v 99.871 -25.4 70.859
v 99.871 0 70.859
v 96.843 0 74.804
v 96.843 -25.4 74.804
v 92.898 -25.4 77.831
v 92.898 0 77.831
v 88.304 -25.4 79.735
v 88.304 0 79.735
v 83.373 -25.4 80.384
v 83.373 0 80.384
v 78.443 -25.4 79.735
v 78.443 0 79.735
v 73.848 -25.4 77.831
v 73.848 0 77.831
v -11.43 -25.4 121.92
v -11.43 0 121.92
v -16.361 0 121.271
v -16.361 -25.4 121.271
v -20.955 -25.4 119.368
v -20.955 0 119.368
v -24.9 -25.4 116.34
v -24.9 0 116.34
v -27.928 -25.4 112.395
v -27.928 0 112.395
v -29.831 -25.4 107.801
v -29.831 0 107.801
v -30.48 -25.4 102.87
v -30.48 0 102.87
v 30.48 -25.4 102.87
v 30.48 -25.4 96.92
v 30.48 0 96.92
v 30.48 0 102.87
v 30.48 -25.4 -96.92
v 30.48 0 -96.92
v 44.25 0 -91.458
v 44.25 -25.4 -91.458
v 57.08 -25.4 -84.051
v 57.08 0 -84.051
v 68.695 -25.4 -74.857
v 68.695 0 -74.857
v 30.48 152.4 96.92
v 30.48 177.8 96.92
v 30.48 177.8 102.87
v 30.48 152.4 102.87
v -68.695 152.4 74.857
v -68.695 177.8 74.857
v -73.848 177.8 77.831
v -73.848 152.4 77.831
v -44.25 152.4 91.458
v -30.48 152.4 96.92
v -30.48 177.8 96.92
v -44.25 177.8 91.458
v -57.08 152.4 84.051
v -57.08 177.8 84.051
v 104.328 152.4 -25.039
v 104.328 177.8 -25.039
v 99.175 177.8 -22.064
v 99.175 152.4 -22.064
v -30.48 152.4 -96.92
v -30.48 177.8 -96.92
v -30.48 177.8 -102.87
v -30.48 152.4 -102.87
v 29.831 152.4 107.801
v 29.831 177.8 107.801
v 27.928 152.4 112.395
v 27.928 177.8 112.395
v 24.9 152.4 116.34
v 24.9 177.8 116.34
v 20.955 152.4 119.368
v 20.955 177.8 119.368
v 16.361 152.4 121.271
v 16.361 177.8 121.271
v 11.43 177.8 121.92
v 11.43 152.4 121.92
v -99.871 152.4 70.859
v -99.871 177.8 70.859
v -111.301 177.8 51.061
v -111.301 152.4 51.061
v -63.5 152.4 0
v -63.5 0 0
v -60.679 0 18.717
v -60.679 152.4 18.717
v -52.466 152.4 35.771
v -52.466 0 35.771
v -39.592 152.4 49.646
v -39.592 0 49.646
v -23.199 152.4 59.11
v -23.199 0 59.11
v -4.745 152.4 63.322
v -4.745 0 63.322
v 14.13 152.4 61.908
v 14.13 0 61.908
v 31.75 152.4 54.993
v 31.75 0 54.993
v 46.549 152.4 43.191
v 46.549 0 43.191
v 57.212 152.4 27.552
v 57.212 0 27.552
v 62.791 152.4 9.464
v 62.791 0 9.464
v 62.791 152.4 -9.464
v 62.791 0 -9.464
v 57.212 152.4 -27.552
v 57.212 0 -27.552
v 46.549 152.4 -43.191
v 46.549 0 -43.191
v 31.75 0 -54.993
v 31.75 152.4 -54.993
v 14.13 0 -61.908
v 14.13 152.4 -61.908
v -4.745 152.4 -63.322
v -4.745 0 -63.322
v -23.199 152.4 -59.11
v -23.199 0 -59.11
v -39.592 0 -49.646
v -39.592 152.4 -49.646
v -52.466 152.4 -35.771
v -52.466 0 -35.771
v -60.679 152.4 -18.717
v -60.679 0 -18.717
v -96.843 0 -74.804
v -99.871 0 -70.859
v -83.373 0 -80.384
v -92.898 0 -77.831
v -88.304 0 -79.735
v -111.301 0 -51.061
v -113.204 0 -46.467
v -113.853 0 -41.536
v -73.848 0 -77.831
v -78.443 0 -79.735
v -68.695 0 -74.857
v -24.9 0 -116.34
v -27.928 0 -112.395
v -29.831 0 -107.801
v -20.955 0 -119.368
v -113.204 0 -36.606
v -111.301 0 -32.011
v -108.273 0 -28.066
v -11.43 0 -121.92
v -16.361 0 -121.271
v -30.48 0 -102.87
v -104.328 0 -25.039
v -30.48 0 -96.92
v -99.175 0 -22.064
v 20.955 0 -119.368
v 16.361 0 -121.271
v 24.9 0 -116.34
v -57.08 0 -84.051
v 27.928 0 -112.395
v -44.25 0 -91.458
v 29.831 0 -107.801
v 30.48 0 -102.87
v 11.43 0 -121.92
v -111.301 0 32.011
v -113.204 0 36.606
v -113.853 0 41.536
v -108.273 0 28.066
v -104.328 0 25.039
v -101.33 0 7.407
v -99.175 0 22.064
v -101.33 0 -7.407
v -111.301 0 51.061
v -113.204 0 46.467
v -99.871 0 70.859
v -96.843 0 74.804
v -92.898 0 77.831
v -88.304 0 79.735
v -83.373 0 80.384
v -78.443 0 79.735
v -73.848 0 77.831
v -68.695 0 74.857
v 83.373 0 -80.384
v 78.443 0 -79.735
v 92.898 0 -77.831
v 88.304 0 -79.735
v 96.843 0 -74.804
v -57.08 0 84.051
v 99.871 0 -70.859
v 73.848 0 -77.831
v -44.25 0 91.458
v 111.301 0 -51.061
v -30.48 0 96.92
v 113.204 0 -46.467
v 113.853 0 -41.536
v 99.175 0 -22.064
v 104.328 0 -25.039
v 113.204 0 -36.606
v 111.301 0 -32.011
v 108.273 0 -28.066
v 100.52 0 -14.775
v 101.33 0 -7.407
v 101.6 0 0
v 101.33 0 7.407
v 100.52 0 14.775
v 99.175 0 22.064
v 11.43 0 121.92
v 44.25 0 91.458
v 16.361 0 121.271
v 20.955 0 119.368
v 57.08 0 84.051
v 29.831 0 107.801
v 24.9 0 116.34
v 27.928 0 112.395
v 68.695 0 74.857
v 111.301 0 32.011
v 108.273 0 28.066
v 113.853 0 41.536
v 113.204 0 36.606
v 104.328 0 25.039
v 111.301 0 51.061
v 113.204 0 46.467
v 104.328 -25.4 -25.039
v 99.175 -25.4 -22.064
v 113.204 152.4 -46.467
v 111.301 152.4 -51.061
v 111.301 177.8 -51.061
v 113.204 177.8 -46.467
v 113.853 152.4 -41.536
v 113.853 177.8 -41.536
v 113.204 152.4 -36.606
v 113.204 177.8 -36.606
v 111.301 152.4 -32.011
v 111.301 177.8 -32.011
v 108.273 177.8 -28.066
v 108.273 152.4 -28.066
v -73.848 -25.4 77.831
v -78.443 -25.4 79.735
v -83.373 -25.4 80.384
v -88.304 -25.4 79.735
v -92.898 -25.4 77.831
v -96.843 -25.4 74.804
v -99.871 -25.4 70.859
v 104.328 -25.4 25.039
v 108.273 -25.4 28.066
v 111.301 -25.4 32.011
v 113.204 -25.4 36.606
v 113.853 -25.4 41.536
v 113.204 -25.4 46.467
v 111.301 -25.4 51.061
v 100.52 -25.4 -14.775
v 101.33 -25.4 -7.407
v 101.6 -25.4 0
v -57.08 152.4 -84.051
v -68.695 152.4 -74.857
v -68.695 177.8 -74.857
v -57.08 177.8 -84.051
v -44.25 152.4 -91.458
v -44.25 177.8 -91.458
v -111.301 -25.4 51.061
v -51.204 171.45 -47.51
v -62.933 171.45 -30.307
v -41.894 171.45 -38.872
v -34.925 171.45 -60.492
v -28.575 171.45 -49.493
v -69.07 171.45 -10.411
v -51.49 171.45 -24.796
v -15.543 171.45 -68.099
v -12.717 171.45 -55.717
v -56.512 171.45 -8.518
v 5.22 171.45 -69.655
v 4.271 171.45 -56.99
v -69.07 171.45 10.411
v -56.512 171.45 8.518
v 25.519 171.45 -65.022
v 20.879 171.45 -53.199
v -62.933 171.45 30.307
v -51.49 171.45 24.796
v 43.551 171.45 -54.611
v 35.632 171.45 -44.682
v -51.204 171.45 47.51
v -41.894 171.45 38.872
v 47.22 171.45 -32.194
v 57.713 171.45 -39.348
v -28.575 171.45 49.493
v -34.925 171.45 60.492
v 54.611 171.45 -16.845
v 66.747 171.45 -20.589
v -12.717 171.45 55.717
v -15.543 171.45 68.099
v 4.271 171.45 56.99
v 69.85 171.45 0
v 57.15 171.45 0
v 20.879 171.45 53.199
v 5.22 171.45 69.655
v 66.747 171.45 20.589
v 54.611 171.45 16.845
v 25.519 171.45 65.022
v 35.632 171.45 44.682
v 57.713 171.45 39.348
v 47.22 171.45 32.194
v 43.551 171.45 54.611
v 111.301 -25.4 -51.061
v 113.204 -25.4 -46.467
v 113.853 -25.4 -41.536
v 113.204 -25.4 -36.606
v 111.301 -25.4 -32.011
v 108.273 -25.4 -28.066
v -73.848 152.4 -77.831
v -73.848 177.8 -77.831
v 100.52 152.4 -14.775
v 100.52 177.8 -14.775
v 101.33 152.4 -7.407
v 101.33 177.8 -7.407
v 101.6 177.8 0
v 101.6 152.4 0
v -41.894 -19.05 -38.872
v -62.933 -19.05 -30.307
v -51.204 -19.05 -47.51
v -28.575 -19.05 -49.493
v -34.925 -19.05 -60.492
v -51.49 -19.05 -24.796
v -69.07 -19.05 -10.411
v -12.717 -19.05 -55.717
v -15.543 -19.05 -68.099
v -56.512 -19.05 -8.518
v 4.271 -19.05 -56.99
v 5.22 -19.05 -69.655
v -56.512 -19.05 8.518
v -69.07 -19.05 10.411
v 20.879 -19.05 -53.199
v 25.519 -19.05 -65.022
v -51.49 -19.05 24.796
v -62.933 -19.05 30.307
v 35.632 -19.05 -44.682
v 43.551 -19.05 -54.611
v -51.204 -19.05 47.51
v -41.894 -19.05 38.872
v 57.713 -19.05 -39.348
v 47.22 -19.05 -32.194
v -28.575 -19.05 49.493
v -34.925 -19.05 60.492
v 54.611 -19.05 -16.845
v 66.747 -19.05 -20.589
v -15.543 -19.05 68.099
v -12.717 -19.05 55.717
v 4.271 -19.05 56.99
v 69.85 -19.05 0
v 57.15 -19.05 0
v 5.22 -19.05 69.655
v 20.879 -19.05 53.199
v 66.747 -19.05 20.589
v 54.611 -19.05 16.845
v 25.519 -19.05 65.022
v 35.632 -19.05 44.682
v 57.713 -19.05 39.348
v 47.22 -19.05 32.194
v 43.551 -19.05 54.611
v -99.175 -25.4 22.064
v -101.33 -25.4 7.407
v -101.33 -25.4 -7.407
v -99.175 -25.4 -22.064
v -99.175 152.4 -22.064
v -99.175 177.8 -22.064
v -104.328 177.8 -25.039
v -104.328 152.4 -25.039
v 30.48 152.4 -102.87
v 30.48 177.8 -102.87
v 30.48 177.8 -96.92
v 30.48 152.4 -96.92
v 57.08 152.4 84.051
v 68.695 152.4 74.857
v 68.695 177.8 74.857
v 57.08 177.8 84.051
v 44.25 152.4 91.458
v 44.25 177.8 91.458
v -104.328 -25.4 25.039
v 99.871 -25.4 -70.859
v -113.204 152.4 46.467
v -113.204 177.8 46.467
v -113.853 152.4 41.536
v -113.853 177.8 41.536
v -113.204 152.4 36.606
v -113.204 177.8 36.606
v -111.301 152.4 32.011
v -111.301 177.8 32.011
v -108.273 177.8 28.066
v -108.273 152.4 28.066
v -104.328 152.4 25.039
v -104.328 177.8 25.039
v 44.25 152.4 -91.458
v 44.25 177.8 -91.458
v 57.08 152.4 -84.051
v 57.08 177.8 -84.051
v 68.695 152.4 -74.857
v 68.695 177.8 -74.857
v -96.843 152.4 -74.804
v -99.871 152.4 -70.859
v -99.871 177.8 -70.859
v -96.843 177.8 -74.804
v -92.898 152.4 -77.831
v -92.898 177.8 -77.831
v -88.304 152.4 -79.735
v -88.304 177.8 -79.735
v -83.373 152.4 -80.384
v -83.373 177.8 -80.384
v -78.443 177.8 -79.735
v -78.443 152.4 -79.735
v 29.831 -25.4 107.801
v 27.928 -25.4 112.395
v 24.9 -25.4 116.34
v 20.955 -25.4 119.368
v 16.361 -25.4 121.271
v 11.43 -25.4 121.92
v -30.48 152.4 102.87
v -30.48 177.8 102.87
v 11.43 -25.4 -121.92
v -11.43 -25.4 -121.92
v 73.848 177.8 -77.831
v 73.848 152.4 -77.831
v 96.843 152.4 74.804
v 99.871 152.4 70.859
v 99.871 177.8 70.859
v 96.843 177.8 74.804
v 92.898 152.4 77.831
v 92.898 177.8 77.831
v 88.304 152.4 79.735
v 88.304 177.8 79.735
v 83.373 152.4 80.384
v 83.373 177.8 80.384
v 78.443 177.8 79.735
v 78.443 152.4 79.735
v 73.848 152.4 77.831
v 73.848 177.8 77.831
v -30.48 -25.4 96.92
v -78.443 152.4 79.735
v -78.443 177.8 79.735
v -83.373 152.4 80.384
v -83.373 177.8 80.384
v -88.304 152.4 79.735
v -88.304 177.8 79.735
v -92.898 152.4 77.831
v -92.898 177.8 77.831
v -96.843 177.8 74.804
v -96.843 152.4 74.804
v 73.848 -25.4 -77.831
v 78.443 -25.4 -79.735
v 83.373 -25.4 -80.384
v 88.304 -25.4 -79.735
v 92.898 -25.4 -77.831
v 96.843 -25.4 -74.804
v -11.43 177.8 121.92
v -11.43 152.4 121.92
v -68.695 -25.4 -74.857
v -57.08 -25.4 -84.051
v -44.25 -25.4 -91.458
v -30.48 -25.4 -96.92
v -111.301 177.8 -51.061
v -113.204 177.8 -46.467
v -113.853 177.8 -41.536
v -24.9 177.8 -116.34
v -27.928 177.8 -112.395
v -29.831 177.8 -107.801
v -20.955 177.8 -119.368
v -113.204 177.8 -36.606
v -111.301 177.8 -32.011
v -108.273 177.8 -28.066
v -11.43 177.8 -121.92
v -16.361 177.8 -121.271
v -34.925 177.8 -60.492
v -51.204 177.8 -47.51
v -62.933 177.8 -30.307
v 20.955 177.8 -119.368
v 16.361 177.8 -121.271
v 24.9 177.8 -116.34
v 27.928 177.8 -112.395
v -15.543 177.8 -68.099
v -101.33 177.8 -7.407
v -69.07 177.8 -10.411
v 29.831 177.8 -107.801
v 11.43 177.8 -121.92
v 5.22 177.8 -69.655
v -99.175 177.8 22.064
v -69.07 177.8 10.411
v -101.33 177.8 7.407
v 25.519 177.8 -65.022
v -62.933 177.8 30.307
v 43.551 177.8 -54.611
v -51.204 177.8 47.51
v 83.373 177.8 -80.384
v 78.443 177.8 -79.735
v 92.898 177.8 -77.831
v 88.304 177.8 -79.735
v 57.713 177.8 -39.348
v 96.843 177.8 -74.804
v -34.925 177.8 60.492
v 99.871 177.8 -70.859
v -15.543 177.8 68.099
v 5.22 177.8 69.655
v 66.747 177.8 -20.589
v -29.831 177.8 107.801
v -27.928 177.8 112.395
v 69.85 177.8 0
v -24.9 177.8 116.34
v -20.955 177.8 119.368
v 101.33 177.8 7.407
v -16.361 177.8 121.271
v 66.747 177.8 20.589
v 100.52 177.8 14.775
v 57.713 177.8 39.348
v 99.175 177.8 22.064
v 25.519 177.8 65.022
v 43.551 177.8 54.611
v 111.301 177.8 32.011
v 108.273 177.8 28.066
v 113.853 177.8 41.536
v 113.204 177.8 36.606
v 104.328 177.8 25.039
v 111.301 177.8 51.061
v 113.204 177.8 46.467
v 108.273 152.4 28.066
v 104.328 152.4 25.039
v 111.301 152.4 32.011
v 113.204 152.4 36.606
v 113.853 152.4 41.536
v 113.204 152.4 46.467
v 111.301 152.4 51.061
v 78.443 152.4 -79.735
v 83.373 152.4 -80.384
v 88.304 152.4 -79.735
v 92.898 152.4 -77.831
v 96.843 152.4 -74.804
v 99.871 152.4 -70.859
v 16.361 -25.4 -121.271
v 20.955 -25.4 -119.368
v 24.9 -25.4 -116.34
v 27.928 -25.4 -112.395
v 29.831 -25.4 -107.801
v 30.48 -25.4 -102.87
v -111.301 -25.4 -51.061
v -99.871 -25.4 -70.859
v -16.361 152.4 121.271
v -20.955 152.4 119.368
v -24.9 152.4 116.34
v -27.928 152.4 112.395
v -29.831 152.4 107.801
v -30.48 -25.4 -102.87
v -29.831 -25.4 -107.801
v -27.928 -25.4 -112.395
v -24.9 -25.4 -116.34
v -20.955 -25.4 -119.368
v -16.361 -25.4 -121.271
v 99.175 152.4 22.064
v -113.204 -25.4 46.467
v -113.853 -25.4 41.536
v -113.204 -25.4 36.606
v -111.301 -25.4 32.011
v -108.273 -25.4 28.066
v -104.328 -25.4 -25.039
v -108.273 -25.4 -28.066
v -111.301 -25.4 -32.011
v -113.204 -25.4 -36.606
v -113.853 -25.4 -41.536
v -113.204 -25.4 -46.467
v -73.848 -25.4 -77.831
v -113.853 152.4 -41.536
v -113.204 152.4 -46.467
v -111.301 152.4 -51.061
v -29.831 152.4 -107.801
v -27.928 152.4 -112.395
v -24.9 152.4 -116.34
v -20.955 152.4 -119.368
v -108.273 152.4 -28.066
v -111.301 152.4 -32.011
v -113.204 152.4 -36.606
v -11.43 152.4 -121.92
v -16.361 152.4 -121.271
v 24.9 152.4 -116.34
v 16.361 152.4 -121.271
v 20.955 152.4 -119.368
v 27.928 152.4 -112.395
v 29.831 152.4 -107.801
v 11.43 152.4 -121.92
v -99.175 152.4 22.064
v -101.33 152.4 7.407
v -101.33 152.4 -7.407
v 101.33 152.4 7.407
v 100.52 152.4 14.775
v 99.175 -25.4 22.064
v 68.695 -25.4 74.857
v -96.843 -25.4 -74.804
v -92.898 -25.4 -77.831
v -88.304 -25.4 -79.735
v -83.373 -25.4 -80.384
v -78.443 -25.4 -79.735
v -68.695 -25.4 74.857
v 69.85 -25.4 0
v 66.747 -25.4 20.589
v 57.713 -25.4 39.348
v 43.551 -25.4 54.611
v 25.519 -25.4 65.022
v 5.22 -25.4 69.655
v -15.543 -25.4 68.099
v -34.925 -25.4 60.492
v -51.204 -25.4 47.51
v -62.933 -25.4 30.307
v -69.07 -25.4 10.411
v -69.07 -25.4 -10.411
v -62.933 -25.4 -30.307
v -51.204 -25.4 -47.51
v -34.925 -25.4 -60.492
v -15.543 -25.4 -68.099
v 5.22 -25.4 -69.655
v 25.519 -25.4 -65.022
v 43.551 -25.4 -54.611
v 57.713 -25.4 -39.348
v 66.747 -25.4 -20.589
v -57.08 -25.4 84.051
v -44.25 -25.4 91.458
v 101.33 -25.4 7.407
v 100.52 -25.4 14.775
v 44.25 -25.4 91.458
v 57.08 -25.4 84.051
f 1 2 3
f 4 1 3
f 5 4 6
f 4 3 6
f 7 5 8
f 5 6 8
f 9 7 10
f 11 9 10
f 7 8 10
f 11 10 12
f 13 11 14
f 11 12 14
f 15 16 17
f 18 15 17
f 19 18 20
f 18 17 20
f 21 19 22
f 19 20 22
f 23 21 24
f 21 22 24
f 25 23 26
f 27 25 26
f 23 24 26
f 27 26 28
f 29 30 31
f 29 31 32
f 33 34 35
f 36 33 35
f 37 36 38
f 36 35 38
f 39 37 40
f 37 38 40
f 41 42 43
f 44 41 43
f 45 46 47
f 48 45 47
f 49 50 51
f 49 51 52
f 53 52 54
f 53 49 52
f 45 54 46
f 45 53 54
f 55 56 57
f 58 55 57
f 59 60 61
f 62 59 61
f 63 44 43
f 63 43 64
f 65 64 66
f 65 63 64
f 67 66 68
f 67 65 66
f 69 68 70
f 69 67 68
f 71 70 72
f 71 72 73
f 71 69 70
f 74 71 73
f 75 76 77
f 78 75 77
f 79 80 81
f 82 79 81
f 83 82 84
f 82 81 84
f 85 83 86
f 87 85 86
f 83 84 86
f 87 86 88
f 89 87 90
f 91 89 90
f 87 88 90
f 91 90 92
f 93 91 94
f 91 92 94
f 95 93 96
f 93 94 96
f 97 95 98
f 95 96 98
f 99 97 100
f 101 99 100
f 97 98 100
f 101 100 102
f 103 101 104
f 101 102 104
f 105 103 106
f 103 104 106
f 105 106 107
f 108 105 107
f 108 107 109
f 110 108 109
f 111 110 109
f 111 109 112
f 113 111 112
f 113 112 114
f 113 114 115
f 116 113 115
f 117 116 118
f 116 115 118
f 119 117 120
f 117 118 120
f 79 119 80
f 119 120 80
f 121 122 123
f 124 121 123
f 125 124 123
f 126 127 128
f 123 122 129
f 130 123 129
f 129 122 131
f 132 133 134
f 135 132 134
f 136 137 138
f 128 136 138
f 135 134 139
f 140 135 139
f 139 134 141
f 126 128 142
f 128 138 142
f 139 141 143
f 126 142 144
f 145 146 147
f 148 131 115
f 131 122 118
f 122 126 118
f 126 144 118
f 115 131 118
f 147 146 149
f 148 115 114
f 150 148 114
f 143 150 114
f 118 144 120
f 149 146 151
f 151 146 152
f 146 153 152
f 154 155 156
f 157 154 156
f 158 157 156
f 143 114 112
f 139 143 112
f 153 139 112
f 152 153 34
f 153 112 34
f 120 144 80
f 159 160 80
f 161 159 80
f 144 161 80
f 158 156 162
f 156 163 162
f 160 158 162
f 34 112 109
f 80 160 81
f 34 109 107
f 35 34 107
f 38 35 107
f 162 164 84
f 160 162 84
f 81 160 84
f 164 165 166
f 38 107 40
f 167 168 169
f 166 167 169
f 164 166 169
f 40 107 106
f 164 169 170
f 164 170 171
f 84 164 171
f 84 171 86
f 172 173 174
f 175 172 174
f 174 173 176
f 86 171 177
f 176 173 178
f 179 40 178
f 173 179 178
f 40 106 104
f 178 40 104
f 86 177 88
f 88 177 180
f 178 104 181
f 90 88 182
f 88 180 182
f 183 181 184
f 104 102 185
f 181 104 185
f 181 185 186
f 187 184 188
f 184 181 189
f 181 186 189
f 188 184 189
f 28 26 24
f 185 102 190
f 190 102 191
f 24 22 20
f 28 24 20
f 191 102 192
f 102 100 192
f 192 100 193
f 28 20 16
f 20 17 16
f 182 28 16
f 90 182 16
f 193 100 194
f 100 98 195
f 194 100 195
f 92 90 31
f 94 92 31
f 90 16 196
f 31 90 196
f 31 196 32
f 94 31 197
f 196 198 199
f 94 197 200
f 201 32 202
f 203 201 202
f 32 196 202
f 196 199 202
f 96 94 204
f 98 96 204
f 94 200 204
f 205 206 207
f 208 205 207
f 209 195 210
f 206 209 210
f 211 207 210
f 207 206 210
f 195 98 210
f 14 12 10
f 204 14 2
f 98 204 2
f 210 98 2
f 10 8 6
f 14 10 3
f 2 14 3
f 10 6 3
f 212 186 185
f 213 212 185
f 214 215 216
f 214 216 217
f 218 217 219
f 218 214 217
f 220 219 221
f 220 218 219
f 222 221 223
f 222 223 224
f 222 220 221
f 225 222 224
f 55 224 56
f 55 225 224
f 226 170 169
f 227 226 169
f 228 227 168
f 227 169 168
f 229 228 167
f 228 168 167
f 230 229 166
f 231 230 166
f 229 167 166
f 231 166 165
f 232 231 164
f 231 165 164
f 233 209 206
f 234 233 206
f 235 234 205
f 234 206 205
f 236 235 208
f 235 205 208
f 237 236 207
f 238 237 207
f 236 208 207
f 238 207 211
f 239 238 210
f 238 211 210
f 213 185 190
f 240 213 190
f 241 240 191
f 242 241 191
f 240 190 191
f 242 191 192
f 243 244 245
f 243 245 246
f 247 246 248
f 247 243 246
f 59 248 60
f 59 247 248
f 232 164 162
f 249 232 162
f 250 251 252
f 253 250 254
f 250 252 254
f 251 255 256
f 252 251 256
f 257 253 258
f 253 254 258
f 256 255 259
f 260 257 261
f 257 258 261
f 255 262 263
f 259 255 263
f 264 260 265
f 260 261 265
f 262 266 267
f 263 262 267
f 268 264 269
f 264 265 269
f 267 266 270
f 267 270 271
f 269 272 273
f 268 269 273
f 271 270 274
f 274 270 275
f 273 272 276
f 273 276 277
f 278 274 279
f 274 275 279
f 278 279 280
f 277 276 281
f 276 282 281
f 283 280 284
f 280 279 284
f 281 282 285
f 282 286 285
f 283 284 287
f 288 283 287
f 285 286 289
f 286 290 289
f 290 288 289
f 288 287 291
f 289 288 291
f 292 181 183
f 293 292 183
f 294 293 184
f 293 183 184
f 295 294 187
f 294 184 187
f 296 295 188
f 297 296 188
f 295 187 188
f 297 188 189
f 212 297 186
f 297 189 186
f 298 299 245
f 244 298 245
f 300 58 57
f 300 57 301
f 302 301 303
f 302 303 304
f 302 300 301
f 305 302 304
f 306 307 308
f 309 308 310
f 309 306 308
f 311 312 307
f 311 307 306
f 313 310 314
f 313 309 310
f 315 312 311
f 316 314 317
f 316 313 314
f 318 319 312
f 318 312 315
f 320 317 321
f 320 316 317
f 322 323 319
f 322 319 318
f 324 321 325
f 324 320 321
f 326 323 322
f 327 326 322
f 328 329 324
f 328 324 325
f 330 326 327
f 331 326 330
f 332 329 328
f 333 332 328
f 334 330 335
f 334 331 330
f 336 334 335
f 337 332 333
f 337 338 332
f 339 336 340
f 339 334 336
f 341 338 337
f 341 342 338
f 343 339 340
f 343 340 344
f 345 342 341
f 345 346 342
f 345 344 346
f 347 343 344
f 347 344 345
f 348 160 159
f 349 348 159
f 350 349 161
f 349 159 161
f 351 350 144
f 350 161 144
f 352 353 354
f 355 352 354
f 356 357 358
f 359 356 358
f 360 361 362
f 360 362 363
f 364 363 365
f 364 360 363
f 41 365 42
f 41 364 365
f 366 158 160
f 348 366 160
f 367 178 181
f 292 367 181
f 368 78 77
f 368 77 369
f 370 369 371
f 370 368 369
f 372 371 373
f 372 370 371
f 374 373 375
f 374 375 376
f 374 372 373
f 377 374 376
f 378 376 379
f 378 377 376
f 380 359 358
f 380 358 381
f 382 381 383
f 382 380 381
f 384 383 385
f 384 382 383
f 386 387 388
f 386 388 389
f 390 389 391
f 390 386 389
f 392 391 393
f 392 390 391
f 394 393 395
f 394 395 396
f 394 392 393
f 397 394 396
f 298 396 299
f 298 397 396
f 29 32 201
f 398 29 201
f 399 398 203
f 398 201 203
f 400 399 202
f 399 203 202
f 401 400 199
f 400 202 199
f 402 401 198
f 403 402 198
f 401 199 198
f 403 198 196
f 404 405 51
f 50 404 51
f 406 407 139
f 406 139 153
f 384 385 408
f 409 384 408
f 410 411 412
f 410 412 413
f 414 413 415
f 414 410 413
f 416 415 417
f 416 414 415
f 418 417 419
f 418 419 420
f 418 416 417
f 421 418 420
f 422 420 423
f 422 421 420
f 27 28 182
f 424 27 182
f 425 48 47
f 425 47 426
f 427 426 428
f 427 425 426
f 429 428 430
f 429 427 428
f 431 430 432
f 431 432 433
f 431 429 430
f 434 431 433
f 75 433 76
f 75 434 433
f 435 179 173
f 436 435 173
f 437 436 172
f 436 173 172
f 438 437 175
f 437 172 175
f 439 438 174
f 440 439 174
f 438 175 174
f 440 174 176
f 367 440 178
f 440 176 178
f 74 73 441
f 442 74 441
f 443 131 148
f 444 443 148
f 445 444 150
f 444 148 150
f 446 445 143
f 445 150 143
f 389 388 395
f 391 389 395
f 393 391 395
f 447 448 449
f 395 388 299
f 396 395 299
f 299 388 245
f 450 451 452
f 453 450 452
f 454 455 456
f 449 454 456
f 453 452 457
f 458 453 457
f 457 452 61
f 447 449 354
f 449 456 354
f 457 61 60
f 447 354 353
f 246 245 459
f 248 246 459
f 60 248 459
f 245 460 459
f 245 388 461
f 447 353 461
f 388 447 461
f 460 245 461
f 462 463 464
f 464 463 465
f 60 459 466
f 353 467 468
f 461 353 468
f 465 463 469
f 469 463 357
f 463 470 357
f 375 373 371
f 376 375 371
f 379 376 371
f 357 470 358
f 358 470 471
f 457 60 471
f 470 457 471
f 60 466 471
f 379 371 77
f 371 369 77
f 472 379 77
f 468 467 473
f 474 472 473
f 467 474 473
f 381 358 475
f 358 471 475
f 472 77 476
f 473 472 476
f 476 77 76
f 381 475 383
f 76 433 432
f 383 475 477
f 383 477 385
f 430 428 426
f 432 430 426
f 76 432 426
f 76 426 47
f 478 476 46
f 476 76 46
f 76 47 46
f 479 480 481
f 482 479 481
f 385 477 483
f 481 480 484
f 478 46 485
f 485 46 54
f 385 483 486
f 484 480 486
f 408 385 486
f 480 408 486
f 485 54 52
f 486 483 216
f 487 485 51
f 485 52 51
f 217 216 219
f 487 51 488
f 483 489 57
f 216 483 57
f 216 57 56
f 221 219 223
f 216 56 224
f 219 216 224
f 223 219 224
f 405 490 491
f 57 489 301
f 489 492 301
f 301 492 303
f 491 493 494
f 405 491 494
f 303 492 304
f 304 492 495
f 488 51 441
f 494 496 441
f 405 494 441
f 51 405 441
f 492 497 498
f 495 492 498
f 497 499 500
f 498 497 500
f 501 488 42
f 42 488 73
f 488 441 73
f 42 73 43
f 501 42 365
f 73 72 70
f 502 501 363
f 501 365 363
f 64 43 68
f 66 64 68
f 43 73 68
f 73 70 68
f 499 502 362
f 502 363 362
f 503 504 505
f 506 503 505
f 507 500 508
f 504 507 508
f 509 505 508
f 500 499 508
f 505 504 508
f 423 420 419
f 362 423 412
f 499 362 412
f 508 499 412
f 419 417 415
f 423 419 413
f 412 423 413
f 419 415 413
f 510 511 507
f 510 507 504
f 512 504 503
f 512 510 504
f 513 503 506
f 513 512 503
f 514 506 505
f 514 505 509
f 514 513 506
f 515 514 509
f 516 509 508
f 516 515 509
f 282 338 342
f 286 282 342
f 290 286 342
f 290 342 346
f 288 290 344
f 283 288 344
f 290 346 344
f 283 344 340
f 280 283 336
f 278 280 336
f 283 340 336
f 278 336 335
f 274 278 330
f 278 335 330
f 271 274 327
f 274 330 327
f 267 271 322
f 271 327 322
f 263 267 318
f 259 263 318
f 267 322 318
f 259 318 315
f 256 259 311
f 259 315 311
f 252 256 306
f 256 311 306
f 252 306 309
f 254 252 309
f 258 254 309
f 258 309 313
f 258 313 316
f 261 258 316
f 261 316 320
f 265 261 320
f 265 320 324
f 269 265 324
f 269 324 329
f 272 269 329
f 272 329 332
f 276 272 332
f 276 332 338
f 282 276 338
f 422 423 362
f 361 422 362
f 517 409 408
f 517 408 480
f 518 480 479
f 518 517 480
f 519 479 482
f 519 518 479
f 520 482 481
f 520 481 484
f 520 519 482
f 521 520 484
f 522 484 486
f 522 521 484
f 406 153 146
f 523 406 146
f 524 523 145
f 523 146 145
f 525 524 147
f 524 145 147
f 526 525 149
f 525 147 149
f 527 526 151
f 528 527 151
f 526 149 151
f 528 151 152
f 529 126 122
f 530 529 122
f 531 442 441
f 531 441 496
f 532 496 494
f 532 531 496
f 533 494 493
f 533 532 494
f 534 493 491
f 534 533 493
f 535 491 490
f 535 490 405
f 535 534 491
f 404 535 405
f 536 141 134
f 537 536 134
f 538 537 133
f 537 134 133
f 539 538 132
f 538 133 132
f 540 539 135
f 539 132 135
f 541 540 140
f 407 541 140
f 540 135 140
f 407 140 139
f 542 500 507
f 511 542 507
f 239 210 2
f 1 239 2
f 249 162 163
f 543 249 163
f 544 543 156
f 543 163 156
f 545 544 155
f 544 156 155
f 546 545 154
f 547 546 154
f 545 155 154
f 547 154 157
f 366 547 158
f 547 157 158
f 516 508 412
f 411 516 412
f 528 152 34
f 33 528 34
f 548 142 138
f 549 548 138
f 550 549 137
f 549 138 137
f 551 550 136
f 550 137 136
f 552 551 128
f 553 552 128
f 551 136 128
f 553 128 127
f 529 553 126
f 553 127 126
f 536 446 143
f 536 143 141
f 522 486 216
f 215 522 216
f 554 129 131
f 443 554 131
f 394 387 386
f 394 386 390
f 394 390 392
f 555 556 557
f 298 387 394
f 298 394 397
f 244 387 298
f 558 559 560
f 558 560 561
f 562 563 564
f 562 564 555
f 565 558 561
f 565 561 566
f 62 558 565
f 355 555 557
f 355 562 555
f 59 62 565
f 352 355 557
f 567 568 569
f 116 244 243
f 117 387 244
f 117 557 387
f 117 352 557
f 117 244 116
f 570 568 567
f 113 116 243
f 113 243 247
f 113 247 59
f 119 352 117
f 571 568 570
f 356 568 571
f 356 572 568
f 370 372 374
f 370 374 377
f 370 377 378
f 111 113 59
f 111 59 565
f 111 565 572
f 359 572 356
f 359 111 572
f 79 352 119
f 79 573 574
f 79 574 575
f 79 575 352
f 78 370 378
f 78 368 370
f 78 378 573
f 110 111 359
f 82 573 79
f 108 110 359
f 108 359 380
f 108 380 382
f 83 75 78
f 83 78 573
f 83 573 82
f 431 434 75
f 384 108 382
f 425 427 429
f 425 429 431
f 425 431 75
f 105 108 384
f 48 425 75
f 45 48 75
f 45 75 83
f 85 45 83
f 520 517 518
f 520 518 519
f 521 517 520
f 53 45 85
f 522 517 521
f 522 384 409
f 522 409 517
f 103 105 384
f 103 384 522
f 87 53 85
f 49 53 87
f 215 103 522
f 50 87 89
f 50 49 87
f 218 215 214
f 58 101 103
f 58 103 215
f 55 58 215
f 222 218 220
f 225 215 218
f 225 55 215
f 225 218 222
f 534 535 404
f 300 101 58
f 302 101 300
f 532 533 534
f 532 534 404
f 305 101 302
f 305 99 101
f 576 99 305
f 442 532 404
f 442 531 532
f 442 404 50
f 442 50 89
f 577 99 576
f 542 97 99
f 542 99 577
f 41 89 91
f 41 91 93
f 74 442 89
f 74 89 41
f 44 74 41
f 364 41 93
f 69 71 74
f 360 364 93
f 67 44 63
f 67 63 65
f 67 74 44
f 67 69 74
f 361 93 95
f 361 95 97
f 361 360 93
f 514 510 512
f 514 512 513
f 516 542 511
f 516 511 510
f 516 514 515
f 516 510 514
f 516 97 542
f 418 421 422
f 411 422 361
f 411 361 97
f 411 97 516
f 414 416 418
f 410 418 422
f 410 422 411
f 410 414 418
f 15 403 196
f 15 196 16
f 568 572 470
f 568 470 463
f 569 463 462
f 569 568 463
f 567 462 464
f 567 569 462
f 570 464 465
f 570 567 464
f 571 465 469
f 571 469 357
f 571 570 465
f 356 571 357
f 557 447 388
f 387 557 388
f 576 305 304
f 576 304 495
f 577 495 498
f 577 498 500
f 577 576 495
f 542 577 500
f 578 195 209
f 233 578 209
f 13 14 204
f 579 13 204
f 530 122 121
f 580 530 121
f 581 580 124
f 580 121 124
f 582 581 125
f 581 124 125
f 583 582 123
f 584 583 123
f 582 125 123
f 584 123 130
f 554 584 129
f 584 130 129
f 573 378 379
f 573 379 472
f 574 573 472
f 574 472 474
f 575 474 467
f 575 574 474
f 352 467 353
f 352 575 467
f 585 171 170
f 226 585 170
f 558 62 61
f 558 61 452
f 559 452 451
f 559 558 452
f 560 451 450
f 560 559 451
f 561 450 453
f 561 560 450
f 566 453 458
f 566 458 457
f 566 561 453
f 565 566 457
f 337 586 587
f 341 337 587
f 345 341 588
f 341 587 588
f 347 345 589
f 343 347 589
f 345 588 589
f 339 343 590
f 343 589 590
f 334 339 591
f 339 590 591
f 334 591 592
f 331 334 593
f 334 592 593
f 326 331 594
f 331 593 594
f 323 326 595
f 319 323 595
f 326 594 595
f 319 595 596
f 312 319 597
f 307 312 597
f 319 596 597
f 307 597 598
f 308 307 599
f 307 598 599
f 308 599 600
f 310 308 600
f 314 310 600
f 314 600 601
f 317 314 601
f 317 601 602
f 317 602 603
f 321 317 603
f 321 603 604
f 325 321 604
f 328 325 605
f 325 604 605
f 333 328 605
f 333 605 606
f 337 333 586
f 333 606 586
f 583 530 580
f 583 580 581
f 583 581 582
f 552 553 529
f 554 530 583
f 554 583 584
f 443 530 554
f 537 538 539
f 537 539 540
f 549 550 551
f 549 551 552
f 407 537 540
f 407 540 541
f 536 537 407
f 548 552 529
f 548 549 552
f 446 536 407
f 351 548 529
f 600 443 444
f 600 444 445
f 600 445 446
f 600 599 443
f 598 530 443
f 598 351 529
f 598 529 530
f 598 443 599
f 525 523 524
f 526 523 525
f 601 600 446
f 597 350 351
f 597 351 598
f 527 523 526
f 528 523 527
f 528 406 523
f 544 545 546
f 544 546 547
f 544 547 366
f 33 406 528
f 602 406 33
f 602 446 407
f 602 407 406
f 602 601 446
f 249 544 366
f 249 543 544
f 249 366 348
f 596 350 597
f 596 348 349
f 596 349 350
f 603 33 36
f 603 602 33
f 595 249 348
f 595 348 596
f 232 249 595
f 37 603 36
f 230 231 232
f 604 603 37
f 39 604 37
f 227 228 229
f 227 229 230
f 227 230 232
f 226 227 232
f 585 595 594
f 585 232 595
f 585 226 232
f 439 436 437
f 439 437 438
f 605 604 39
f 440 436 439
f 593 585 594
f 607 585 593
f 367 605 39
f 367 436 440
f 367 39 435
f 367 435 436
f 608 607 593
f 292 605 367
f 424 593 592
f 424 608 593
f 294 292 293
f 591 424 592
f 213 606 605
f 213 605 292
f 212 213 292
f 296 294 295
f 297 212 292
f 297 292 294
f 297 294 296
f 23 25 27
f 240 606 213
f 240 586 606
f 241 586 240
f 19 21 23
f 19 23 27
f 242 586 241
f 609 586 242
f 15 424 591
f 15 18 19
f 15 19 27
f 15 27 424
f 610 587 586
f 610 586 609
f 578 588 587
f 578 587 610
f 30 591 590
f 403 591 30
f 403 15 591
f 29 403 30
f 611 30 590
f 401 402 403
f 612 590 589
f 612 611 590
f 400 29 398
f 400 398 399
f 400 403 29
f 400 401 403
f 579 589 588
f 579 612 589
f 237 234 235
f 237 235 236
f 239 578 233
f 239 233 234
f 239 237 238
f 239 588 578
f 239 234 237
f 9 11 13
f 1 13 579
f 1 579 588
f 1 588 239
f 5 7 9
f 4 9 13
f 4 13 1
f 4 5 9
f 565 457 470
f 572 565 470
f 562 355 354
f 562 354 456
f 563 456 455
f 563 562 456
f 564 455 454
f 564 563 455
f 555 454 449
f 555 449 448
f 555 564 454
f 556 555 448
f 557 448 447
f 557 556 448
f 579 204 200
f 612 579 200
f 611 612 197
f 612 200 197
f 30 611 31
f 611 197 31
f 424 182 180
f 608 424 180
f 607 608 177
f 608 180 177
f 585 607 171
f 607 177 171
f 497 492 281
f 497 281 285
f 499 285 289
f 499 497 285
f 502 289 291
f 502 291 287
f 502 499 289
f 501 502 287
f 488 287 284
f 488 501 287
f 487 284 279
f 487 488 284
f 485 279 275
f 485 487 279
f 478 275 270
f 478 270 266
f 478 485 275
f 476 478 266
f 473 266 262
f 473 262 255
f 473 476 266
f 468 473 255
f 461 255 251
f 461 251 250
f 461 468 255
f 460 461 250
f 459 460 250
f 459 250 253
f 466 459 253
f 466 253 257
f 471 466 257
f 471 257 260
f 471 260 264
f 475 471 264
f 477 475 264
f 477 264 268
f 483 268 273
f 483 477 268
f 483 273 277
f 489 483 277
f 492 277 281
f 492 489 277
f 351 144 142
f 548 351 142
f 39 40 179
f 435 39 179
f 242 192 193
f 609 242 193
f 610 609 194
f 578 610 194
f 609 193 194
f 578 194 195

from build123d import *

# Parameters (mm, degrees)
F1_DEPTH = 25.4
F2_R     = 63.5
F3_DEPTH = 152.4
F6_R     = 57.15
F7_DEPTH = 228.6
F8_R     = 69.85
F8_R_2   = 57.15
F9_DEPTH = 6.35


with BuildPart() as f1:
    # F0 (on Front) → F1 (new body)
    with BuildSketch(Plane.XZ):
        with BuildLine():
            ThreePointArc((99.175375, -22.063657), (100.992025, -11.098241), (101.6, 0))
            ThreePointArc((101.6, 0), (100.992025, 11.098241), (99.175375, 22.063657))
            ThreePointArc((99.175375, 22.063657), (87.988181, 50.8), (68.695375, 74.856566))
            ThreePointArc((68.695375, 74.856566), (50.8, 87.988181), (30.48, 96.920223))
            ThreePointArc((30.48, 96.920223), (0, 101.6), (-30.48, 96.920223))
            ThreePointArc((-30.48, 96.920223), (-50.8, 87.988181), (-68.695375, 74.856566))
            ThreePointArc((-68.695375, 74.856566), (-87.988181, 50.8), (-99.175375, 22.063657))
            ThreePointArc((-99.175375, 22.063657), (-101.6, 0), (-99.175375, -22.063657))
            ThreePointArc((-99.175375, -22.063657), (-87.988181, -50.8), (-68.695375, -74.856566))
            ThreePointArc((-68.695375, -74.856566), (-50.8, -87.988181), (-30.48, -96.920223))
            ThreePointArc((-30.48, -96.920223), (0, -101.6), (30.48, -96.920223))
            ThreePointArc((30.48, -96.920223), (50.8, -87.988181), (68.695375, -74.856566))
            ThreePointArc((68.695375, -74.856566), (87.988181, -50.8), (99.175375, -22.063657))
        make_face()
        with BuildLine():
            ThreePointArc((-30.48, 96.920223), (0, 101.6), (30.48, 96.920223))
            Line((30.48, 96.920223), (30.48, 102.87))
            ThreePointArc((30.48, 102.87), (24.900384, 116.340384), (11.43, 121.92))
            Line((11.43, 121.92), (-11.43, 121.92))
            ThreePointArc((-11.43, 121.92), (-24.900384, 116.340384), (-30.48, 102.87))
            Line((-30.48, 102.87), (-30.48, 96.920223))
        make_face()
        with BuildLine():
            ThreePointArc((68.695375, 74.856566), (87.988181, 50.8), (99.175375, 22.063657))
            Line((99.175375, 22.063657), (104.328033, 25.038546))
            ThreePointArc((104.328033, 25.038546), (113.20392, 36.605827), (111.300817, 51.06133))
            Line((111.300817, 51.06133), (99.870817, 70.85867))
            ThreePointArc((99.870817, 70.85867), (88.303536, 79.734557), (73.848033, 77.831454))
            Line((73.848033, 77.831454), (68.695375, 74.856566))
        make_face()
        with BuildLine():
            Line((104.328033, -25.038546), (99.175375, -22.063657))
            ThreePointArc((99.175375, -22.063657), (87.988181, -50.8), (68.695375, -74.856566))
            Line((68.695375, -74.856566), (73.848033, -77.831454))
            ThreePointArc((73.848033, -77.831454), (88.303536, -79.734557), (99.870817, -70.85867))
            Line((99.870817, -70.85867), (111.300817, -51.06133))
            ThreePointArc((111.300817, -51.06133), (113.20392, -36.605827), (104.328033, -25.038546))
        make_face()
        with BuildLine():
            Line((30.48, -102.87), (30.48, -96.920223))
            ThreePointArc((30.48, -96.920223), (0, -101.6), (-30.48, -96.920223))
            Line((-30.48, -96.920223), (-30.48, -102.87))
            ThreePointArc((-30.48, -102.87), (-24.900384, -116.340384), (-11.43, -121.92))
            Line((-11.43, -121.92), (11.43, -121.92))
            ThreePointArc((11.43, -121.92), (24.900384, -116.340384), (30.48, -102.87))
        make_face()
        with BuildLine():
            Line((-73.848033, -77.831454), (-68.695375, -74.856566))
            ThreePointArc((-68.695375, -74.856566), (-87.988181, -50.8), (-99.175375, -22.063657))
            Line((-99.175375, -22.063657), (-104.328033, -25.038546))
            ThreePointArc((-104.328033, -25.038546), (-113.20392, -36.605827), (-111.300817, -51.06133))
            Line((-111.300817, -51.06133), (-99.870817, -70.85867))
            ThreePointArc((-99.870817, -70.85867), (-88.303536, -79.734557), (-73.848033, -77.831454))
        make_face()
        with BuildLine():
            ThreePointArc((-99.175375, 22.063657), (-87.988181, 50.8), (-68.695375, 74.856566))
            Line((-68.695375, 74.856566), (-73.848033, 77.831454))
            ThreePointArc((-73.848033, 77.831454), (-88.303536, 79.734557), (-99.870817, 70.85867))
            Line((-99.870817, 70.85867), (-111.300817, 51.06133))
            ThreePointArc((-111.300817, 51.06133), (-113.20392, 36.605827), (-104.328033, 25.038546))
            Line((-104.328033, 25.038546), (-99.175375, 22.063657))
        make_face()
    extrude(amount=F1_DEPTH)

    # F2 (on face) → F3 (join)
    with BuildSketch(Plane(origin=(0, 0, 0), x_dir=(-1, 0, 0), z_dir=(0, 1, 0))):
        Circle(F2_R)
    extrude(amount=F3_DEPTH)

    # F5: F1 across plane


with BuildPart() as f1_1:
    add(f1.part)
    add(f1.part.mirror(Plane(origin=(0, 76.2, 0), x_dir=(1, 0, 0), z_dir=(0, 1, 0))))

    # F6 (on face) → F7 (cut)
    with BuildSketch(Plane.XZ.offset(25.4)):
        Circle(F6_R)
    extrude(amount=-F7_DEPTH, mode=Mode.SUBTRACT)

    # F8 (on face) → F9 (cut)
    with BuildSketch(Plane.XZ.offset(25.4)):
        Circle(F8_R)
        Circle(F8_R_2, mode=Mode.SUBTRACT)
    extrude(amount=-F9_DEPTH, mode=Mode.SUBTRACT)

    # F10: F1 across plane


with BuildPart() as f1_2:
    add(f1_1.part)
    add(f1_1.part.mirror(Plane(origin=(0, 76.2, 0), x_dir=(1, 0, 0), z_dir=(0, 1, 0))), mode=Mode.INTERSECT)


solid = f1_2.part
